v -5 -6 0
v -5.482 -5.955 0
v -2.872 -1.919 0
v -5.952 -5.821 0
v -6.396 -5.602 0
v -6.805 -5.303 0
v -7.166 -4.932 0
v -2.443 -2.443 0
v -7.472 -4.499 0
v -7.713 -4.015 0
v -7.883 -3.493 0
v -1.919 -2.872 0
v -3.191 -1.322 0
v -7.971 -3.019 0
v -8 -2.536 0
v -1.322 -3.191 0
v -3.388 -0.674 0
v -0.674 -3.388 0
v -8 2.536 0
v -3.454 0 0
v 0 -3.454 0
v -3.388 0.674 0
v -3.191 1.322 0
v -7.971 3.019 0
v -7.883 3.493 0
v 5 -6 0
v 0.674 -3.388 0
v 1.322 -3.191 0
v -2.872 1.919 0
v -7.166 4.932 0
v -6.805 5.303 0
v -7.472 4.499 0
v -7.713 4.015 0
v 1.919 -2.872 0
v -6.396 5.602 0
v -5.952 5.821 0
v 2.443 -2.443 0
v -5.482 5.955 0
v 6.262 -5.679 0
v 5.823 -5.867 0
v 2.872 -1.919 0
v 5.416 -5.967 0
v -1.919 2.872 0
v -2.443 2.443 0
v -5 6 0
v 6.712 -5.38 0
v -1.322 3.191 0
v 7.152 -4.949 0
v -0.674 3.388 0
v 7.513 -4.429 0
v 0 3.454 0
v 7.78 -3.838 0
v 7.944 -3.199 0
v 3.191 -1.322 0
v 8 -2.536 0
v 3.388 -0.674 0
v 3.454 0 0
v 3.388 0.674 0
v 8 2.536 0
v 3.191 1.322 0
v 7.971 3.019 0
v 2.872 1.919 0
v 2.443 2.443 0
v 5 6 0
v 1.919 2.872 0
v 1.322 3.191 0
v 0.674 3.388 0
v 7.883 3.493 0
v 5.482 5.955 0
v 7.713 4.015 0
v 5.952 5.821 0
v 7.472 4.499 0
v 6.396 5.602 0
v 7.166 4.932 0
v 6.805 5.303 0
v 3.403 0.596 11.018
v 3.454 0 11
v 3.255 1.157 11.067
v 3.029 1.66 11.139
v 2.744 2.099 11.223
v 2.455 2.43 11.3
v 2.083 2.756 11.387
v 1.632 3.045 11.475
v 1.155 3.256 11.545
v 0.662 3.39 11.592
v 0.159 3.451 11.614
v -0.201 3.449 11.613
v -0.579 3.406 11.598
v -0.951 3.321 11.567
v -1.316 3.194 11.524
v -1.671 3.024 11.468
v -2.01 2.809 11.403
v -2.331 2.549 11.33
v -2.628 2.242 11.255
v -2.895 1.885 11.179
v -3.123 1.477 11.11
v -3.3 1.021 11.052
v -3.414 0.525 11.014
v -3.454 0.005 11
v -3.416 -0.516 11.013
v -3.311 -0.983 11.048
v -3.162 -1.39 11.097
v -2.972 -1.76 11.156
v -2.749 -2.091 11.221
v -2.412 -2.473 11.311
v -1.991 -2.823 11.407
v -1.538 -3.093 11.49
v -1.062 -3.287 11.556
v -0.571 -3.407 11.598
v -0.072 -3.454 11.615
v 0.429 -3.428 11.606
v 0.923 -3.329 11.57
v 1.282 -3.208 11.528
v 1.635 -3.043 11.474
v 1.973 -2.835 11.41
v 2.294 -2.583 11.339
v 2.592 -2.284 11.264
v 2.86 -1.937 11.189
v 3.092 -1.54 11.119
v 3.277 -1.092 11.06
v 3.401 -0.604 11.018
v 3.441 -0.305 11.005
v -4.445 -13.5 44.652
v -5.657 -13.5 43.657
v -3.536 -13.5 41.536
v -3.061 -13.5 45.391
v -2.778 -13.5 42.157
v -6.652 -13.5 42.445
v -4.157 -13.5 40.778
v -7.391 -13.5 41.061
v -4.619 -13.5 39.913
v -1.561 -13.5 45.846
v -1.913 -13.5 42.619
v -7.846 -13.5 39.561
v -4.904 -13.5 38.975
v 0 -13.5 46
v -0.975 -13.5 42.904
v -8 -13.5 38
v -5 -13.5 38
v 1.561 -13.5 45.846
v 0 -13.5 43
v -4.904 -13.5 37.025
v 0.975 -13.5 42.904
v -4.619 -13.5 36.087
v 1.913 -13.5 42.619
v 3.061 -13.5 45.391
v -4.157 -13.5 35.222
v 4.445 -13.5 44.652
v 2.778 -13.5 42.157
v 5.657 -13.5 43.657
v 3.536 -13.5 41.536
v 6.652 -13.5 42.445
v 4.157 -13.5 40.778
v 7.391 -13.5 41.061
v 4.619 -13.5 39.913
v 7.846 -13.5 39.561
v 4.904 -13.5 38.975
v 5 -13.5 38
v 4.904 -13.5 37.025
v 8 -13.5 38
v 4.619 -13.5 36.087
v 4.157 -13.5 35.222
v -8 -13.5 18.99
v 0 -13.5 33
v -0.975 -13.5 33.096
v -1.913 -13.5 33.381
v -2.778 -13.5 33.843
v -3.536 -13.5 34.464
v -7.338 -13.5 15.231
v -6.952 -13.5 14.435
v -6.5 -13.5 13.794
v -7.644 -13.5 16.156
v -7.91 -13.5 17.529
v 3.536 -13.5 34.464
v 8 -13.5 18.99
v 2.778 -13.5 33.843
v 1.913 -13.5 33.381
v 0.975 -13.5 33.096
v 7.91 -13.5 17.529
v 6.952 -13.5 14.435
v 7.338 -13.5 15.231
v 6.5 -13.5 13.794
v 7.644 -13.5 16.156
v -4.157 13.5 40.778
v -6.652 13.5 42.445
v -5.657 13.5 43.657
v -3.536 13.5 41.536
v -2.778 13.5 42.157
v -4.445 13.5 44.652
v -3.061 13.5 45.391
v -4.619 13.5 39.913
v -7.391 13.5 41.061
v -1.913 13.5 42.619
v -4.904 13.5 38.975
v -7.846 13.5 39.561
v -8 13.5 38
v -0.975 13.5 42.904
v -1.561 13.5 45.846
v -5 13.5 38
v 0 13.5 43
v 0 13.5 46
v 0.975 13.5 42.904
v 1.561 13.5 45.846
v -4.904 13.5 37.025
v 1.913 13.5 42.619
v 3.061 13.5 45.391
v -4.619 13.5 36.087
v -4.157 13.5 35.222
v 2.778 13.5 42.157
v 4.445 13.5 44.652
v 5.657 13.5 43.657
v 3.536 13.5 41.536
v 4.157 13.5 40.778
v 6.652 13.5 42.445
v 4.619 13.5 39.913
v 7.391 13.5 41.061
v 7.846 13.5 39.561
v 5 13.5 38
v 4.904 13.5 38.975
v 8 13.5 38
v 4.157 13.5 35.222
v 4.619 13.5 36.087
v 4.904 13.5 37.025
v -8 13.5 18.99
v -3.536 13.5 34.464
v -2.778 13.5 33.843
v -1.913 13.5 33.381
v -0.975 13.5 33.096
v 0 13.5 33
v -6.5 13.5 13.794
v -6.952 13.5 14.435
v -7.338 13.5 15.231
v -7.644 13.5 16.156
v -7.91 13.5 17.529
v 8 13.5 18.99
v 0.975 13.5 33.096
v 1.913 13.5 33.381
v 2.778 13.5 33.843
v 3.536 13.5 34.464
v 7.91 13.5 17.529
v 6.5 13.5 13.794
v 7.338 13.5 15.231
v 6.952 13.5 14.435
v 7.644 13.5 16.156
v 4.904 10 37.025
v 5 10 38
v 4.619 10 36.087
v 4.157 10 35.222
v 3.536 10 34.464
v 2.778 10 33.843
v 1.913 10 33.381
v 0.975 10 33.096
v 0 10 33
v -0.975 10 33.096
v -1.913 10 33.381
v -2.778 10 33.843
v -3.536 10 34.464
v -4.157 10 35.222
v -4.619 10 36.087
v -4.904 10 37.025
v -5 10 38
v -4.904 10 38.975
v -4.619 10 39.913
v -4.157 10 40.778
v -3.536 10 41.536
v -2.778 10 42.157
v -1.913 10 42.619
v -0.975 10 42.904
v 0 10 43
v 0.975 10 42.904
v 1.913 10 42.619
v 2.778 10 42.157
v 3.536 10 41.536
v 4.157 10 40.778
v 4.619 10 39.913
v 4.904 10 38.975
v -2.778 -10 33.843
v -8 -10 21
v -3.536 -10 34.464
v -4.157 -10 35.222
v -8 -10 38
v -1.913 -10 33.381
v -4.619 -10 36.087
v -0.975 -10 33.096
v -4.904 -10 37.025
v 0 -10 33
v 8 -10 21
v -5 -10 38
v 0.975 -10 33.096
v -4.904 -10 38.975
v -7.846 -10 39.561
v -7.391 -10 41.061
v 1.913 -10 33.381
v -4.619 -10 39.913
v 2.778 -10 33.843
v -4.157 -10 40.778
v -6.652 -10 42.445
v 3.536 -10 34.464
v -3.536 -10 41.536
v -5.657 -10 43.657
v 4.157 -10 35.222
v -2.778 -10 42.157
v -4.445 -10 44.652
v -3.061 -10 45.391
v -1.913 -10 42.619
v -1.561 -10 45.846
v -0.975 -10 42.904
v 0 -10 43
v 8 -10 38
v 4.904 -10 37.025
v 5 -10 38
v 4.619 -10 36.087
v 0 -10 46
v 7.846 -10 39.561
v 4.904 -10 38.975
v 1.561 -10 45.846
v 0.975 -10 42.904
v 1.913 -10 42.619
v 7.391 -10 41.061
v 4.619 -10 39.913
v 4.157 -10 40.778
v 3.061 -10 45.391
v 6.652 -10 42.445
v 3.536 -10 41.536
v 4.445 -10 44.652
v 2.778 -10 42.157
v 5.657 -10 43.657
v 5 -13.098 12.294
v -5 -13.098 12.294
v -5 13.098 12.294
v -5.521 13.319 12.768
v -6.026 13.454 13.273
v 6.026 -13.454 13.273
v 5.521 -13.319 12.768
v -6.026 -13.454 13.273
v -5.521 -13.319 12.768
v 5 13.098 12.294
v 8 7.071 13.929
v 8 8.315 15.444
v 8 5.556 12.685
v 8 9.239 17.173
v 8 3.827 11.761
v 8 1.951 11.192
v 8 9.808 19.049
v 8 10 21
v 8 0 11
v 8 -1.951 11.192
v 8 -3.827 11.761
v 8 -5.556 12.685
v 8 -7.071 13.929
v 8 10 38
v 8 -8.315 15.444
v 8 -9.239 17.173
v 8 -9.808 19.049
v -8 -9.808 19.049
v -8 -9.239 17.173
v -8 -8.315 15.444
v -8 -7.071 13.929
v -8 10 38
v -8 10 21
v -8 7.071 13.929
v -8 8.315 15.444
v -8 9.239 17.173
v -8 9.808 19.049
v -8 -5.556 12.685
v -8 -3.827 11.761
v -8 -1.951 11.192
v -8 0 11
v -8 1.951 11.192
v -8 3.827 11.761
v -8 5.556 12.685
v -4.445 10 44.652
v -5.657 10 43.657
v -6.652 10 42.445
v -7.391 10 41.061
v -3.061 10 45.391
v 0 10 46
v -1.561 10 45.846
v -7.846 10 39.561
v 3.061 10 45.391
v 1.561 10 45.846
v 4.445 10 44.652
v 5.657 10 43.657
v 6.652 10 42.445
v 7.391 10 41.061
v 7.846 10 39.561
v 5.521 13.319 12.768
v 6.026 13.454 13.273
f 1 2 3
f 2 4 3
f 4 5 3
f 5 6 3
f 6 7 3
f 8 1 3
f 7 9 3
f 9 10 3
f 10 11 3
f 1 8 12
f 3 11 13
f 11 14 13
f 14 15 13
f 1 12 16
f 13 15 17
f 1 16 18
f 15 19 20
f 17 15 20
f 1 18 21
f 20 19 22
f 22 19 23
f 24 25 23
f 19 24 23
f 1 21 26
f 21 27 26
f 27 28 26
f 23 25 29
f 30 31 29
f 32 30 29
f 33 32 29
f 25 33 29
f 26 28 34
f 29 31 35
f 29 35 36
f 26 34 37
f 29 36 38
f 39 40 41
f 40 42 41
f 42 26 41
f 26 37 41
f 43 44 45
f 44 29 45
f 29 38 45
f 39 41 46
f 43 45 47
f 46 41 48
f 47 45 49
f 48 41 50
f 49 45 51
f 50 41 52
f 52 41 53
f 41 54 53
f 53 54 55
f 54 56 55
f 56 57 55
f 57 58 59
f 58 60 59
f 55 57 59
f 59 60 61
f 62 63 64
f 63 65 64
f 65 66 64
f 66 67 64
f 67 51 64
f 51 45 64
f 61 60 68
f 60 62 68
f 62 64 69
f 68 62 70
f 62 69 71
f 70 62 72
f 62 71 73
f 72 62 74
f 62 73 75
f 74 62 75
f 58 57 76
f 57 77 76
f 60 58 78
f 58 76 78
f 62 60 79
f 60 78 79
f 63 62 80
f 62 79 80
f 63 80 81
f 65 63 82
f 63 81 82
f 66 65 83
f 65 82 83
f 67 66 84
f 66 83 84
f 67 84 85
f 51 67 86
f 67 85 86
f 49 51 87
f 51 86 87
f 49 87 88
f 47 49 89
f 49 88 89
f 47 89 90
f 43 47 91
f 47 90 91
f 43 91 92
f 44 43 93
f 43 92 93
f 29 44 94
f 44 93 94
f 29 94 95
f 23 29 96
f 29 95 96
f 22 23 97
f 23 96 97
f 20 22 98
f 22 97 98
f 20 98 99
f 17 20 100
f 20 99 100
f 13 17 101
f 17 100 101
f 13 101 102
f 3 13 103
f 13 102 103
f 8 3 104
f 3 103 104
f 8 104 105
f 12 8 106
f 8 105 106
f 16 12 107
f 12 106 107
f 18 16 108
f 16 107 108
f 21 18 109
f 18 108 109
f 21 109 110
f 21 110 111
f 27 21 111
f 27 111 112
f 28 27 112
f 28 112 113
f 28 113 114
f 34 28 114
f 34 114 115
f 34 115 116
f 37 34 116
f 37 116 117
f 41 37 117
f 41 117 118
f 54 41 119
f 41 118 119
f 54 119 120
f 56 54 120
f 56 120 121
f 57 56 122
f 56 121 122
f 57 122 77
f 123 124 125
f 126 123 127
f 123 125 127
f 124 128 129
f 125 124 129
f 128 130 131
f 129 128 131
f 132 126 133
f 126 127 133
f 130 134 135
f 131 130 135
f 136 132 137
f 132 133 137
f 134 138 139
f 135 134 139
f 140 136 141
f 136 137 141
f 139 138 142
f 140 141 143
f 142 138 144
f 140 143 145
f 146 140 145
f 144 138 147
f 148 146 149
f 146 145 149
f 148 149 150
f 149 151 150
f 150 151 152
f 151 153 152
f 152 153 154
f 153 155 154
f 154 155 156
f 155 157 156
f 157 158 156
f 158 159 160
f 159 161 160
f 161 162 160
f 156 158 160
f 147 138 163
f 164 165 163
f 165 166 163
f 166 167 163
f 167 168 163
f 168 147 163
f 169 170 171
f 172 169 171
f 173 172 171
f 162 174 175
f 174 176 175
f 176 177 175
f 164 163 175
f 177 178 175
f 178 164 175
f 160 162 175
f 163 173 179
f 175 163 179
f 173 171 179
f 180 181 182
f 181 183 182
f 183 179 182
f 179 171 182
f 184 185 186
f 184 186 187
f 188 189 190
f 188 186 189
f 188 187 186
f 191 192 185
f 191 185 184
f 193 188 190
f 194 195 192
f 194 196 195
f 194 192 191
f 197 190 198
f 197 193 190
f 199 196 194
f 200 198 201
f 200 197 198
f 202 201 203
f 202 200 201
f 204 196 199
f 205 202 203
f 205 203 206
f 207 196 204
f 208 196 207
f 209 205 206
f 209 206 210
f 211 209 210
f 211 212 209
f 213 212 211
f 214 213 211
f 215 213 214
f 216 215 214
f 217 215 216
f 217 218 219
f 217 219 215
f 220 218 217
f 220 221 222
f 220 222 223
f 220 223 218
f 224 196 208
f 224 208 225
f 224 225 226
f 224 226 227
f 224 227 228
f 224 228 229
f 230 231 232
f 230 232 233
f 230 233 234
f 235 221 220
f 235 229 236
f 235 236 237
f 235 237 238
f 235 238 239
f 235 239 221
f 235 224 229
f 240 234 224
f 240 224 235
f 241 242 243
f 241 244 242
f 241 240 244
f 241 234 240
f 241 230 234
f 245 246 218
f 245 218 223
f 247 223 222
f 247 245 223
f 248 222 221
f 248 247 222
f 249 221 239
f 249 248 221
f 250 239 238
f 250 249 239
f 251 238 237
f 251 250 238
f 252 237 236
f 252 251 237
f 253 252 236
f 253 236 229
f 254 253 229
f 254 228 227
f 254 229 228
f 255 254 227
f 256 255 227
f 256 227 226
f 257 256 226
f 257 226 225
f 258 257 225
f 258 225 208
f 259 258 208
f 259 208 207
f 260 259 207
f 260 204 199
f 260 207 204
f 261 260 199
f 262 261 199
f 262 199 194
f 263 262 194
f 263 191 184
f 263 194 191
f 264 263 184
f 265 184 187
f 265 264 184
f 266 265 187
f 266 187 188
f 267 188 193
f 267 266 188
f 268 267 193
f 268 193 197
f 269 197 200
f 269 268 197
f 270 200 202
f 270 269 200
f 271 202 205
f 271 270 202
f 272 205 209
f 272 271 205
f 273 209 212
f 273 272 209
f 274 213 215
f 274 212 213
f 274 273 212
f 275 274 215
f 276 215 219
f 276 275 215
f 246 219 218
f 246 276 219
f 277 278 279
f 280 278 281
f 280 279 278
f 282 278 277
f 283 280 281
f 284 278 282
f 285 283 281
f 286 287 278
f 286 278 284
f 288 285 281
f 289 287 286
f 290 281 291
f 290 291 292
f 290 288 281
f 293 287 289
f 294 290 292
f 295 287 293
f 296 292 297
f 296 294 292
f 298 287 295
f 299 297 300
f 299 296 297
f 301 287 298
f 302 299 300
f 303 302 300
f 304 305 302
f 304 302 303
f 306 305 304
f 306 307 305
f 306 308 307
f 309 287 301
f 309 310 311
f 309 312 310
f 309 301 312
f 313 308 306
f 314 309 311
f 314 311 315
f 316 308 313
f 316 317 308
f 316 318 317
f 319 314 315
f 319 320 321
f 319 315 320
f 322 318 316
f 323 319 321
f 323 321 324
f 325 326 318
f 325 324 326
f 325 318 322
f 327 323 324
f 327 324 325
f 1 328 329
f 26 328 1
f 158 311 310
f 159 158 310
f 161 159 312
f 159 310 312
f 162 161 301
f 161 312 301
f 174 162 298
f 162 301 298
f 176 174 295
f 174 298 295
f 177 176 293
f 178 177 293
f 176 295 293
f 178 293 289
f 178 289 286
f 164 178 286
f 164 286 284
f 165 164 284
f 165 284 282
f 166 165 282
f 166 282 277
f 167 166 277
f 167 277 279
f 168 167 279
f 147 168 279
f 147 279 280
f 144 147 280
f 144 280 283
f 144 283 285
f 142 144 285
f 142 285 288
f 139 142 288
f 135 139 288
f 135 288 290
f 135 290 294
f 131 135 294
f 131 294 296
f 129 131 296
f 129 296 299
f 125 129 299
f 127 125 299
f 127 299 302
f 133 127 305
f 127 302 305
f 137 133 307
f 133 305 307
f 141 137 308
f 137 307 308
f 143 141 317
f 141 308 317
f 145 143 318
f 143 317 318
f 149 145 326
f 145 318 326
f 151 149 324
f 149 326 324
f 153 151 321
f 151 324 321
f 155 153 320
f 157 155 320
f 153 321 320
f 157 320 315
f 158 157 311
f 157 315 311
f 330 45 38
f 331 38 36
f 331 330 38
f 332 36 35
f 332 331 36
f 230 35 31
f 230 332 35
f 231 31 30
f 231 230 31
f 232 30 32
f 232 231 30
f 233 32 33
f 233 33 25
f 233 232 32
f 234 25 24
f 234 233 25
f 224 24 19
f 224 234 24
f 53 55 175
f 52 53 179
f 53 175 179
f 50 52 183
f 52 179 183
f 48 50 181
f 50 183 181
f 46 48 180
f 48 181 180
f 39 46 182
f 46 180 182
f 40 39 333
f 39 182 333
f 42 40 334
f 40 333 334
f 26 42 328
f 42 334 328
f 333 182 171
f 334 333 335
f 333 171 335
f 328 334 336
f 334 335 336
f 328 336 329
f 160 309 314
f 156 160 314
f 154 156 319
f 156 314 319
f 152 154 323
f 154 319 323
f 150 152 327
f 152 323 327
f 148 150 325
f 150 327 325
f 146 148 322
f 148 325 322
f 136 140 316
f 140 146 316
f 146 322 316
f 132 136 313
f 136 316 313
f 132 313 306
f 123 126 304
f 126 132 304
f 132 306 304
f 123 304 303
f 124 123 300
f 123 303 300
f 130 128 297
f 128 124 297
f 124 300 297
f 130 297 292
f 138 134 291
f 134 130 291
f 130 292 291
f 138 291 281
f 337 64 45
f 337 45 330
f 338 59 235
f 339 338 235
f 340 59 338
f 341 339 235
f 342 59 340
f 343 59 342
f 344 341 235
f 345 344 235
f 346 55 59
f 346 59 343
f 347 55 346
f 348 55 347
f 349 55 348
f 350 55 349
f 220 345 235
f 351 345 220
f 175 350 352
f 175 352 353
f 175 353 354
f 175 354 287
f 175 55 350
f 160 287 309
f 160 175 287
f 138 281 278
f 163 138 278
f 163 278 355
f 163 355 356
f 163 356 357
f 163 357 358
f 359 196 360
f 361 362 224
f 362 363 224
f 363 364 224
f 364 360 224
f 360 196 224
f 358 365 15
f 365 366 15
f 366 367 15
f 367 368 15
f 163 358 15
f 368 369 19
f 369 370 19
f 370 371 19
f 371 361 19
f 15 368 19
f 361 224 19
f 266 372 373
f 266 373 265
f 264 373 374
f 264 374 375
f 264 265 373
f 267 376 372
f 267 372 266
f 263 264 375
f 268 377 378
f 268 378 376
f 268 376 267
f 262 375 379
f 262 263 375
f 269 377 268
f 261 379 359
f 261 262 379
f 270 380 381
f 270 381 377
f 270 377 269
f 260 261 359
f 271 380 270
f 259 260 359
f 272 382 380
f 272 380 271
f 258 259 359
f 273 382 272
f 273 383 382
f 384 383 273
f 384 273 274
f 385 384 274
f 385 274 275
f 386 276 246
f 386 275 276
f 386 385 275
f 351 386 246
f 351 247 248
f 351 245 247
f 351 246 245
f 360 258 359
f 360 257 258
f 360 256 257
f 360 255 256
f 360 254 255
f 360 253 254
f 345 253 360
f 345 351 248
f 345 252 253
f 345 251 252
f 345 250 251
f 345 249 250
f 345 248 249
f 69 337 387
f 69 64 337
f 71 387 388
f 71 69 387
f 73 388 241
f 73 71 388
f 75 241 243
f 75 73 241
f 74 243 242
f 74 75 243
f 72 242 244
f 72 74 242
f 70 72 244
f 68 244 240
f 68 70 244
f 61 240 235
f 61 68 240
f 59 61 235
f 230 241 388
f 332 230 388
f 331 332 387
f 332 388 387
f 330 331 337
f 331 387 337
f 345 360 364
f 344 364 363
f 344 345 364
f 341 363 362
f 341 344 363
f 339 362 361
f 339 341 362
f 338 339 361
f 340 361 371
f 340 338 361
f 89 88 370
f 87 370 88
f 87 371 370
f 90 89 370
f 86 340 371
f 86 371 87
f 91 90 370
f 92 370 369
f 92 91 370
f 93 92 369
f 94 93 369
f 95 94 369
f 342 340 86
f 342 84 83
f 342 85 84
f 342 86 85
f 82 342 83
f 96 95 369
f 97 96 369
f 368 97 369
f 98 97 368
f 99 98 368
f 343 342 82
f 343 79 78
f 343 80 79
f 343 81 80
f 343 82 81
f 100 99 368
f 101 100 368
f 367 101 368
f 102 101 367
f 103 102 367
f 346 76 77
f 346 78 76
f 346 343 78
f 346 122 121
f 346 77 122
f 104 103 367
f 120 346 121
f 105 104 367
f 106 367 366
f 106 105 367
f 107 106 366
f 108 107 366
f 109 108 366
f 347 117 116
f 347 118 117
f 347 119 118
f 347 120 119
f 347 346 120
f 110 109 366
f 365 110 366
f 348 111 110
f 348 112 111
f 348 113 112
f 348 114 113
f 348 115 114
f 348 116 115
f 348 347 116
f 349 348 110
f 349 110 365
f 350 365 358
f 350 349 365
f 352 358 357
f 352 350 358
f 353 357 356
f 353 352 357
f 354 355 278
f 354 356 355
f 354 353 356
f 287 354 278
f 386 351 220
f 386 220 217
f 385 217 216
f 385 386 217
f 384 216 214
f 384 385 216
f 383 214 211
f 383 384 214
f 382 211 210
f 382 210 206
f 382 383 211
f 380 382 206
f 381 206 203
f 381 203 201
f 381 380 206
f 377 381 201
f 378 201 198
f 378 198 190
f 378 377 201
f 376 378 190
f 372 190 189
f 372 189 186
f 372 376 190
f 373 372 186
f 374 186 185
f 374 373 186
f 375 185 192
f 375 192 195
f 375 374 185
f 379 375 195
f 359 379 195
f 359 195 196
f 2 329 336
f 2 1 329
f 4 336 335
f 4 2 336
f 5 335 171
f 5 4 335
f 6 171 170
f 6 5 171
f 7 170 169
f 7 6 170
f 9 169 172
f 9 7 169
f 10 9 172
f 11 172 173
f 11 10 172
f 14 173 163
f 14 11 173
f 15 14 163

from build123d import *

# Parameters (mm, degrees)
SKETCH1_W                = 22
SKETCH1_H                = 27
EXTRUDE1_DEPTH           = 60
EXTRUDE2_DEPTH           = 12
EXTRUDE2_DEPTH_BACK      = 12
SKETCH3_R                = 5
EXTRUDE3_DEPTH           = 14.5
EXTRUDE3_DEPTH_BACK      = 14.5
F_5_16_24_TAPPED_HOLE2_D = 6.9088
CUT_EXTRUDE1_DEPTH       = 9.0000001
CUT_EXTRUDE1_DEPTH_BACK  = 9.0000001
FILLET2_R                = 3


with BuildPart() as part:
    # Sketch1 → Extrude1 (new body)
    with BuildSketch(Plane.XY):
        Rectangle(SKETCH1_W, SKETCH1_H)
    extrude(amount=EXTRUDE1_DEPTH)

    # Sketch2 → Extrude2 (cut, two sides)
    with BuildSketch(Plane(origin=(0, 0, 0), x_dir=(0, 0, -1), z_dir=(1, 0, 0))) as extrude2_sk:
        with BuildLine():
            Line((-66.910918786, 10), (-21, 10))
            ThreePointArc((-21, 10), (-11, 0), (-21, -10))
            Line((-21, -10), (-66.910918786, -10))
            Line((-66.910918786, -10), (-66.910918786, 10))
        make_face()
    extrude(amount=EXTRUDE2_DEPTH, mode=Mode.SUBTRACT)
    extrude(extrude2_sk.sketch, amount=-EXTRUDE2_DEPTH_BACK, mode=Mode.SUBTRACT)

    # Sketch3 → Extrude3 (cut, two sides)
    with BuildSketch(Plane(origin=(0, 0, 0), x_dir=(1, 0, 0), z_dir=(0, 1, 0))) as extrude3_sk:
        with Locations((0, -38)):
            Circle(SKETCH3_R)
        with BuildLine():
            Line((-8, -38), (-8, 11.717299326))
            Line((-8, 11.717299326), (-29.903870298, 11.717299326))
            Line((-29.903870298, 11.717299326), (-29.903870298, -74.658770221))
            Line((-29.903870298, -74.658770221), (37.768949852, -74.658770221))
            Line((37.768949852, -74.658770221), (37.768949852, 11.717299326))
            Line((37.768949852, 11.717299326), (8, 11.717299326))
            Line((8, 11.717299326), (8, -38))
            ThreePointArc((8, -38), (0, -46), (-8, -38))
        make_face()
    extrude(amount=EXTRUDE3_DEPTH, mode=Mode.SUBTRACT)
    extrude(extrude3_sk.sketch, amount=-EXTRUDE3_DEPTH_BACK, mode=Mode.SUBTRACT)

    # 5_16-24 Tapped Hole2 (through all)
    with Locations(Plane(origin=(0, 0, 0), x_dir=(-1, 0, 0), z_dir=(0, 0, -1))):
        with Locations((0, 0)):
            Hole(F_5_16_24_TAPPED_HOLE2_D / 2)

    # Sketch8 → Cut-Extrude1 (cut, two sides)
    with BuildSketch(Plane(origin=(0, 0, 0), x_dir=(0, 0, -1), z_dir=(1, 0, 0))) as cut_extrude1_sk:
        Polygon((0, -6), (0, 6), (-17.643434352, 16.186441572), (9.090258644, 16.186441572), (9.090258644, -16.186441572), (-17.643434352, -16.186441572), align=None)
    extrude(amount=CUT_EXTRUDE1_DEPTH, mode=Mode.SUBTRACT)
    extrude(cut_extrude1_sk.sketch, amount=-CUT_EXTRUDE1_DEPTH_BACK, mode=Mode.SUBTRACT)

    # Fillet2
    fillet2_edges = [part.edges().sort_by_distance(p)[0] for p in [
        (-8, 9.75, 6.495190528),
        (8, 9.75, 6.495190528),
        (8, -9.75, 6.495190528),
        (0, 13.5, 12.990381057),
        (-8, -9.75, 6.495190528),
        (0, -13.5, 12.990381057),
    ]]
    fillet(fillet2_edges, radius=FILLET2_R)


solid = part.part
